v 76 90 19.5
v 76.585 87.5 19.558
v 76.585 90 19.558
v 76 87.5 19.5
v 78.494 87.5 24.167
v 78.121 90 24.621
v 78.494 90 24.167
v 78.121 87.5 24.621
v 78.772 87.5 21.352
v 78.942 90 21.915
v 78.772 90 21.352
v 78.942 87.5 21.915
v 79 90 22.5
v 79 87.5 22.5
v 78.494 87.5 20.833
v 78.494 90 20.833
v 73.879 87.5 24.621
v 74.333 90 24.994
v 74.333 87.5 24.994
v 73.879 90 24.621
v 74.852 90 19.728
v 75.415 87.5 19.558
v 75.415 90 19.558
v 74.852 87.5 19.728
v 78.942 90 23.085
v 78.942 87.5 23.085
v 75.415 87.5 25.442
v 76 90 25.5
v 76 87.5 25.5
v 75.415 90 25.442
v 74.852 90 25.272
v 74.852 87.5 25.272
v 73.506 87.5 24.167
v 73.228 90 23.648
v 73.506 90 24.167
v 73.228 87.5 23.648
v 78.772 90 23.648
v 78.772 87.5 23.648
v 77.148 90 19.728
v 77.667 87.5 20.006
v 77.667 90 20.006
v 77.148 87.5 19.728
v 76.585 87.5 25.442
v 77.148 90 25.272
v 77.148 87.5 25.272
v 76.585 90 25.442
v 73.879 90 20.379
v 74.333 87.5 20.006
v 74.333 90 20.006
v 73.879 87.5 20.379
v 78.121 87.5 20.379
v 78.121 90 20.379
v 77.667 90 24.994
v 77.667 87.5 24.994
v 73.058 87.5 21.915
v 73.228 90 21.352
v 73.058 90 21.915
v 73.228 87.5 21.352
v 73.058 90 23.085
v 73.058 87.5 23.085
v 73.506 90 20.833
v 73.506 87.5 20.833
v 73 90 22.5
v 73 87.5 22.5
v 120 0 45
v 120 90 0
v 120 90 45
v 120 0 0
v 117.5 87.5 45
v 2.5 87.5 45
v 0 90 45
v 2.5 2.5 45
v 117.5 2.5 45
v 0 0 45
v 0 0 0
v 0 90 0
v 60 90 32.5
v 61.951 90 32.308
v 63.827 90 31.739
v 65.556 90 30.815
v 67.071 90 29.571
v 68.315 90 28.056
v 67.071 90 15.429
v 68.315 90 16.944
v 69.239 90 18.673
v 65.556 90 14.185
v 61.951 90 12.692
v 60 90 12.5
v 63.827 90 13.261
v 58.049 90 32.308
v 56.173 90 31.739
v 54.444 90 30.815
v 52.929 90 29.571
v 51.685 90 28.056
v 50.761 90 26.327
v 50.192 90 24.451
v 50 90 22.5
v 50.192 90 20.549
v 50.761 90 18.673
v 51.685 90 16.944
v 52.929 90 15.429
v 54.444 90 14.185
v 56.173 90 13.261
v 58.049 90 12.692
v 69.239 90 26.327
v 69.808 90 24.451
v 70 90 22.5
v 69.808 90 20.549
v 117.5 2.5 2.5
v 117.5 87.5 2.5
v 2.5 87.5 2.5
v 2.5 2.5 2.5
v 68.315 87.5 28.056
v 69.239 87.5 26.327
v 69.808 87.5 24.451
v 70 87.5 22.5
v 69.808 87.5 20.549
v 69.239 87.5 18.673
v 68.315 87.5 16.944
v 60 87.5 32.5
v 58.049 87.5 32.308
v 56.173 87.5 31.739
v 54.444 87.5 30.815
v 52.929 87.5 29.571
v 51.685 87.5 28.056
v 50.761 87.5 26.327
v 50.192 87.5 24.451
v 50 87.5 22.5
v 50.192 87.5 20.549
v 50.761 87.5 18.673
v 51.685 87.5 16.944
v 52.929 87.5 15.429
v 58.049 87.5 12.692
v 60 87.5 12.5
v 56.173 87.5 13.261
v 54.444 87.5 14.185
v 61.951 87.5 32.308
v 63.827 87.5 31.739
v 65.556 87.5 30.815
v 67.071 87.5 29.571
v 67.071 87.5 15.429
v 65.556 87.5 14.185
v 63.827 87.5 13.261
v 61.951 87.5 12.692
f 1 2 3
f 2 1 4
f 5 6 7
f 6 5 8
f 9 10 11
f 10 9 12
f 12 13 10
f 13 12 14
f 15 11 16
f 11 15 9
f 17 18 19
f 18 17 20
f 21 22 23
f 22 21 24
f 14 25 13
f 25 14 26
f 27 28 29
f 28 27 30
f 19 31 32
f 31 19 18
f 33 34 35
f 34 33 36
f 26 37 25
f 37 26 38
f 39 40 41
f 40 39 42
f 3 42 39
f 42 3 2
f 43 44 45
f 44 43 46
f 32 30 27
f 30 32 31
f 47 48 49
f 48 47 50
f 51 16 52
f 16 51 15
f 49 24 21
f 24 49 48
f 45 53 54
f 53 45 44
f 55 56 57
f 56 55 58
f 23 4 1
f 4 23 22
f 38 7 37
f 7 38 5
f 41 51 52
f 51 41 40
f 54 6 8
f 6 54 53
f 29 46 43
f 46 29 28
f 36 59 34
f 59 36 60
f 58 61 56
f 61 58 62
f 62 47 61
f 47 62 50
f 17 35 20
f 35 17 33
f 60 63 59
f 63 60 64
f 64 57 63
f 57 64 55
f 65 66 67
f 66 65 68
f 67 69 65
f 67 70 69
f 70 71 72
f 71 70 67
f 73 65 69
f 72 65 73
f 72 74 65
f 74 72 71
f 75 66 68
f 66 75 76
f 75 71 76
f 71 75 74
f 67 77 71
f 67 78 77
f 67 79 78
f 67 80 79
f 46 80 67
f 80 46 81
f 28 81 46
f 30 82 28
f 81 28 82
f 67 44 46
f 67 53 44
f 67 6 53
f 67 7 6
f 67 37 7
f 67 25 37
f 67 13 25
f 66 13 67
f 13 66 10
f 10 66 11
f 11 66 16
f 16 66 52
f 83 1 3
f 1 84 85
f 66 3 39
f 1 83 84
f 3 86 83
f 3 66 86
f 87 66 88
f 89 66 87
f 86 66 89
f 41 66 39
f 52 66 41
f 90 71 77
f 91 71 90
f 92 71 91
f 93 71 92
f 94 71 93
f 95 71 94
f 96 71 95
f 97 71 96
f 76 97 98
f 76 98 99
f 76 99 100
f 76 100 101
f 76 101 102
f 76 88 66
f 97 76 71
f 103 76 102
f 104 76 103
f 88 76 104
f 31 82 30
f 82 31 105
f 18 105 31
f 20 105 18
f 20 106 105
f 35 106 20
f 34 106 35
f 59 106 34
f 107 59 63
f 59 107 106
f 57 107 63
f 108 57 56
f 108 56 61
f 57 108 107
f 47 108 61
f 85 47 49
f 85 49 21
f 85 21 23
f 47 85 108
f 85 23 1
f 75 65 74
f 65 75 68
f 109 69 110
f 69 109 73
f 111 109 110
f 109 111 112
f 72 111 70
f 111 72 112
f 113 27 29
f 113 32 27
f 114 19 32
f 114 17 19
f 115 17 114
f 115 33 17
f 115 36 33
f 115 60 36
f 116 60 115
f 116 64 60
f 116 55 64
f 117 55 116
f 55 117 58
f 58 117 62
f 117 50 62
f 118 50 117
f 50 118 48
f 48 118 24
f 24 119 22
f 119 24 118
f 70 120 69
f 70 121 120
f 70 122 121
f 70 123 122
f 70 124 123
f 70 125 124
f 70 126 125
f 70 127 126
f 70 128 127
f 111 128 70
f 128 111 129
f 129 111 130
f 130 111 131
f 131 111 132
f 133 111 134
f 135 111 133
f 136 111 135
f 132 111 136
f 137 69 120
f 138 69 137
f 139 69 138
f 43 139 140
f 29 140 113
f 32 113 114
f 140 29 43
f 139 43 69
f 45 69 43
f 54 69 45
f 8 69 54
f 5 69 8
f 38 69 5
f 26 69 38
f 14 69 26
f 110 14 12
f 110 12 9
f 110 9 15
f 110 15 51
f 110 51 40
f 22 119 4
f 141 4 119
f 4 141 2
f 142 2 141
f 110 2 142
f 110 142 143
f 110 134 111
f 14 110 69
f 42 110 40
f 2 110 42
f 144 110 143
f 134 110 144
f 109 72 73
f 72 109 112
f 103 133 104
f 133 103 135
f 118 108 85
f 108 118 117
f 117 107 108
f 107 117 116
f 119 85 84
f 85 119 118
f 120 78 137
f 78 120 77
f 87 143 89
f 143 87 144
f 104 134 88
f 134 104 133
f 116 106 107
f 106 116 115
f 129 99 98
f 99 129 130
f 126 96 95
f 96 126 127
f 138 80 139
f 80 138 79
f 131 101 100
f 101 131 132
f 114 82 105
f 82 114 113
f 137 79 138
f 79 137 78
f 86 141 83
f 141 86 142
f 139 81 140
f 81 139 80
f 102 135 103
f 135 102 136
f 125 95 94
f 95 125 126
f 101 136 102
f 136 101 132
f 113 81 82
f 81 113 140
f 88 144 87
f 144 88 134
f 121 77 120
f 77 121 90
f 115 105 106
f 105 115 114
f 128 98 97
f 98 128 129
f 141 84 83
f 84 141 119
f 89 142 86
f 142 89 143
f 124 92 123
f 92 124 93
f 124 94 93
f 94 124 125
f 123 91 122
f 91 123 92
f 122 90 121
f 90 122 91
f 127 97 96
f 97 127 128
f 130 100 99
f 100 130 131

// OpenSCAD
$fn = 32;

// ----------------------------------------------------------------------
// Vent box: roundvent enclosure
// ----------------------------------------------------------------------

// --- parameters (mm) ---
box_l = 120;              // box length, X
box_w = 90;               // box width, Y
box_h = 45;               // box height, Z
wall_t = 2.5;             // shell wall thickness
vent_d = 20;              // central vent diameter
ring_d = 6;               // ring hole diameter
n_ring = 8;               // holes in the ring
ring_r = 16;              // ring radius

ring_step = 360 / n_ring;  // ring hole angular step

difference() {
  cube([box_l, box_w, box_h]);
  translate([wall_t, wall_t, wall_t])
    cube([box_l - 2 * wall_t, box_w - 2 * wall_t, box_h]);
  translate([box_l / 2, box_w - wall_t - 1, box_h / 2])
    rotate([-90, 0, 0]) cylinder(h = wall_t + 2, d = vent_d);
  for (i = [0 : n_ring - 1])
    translate([box_l / 2, box_w - wall_t - 1, box_h / 2])
      rotate([0, 0, i * ring_step])
        translate([ring_r, 0, 0]) rotate([-90, 0, 0])
          cylinder(h = wall_t + 2, d = ring_d);
}
